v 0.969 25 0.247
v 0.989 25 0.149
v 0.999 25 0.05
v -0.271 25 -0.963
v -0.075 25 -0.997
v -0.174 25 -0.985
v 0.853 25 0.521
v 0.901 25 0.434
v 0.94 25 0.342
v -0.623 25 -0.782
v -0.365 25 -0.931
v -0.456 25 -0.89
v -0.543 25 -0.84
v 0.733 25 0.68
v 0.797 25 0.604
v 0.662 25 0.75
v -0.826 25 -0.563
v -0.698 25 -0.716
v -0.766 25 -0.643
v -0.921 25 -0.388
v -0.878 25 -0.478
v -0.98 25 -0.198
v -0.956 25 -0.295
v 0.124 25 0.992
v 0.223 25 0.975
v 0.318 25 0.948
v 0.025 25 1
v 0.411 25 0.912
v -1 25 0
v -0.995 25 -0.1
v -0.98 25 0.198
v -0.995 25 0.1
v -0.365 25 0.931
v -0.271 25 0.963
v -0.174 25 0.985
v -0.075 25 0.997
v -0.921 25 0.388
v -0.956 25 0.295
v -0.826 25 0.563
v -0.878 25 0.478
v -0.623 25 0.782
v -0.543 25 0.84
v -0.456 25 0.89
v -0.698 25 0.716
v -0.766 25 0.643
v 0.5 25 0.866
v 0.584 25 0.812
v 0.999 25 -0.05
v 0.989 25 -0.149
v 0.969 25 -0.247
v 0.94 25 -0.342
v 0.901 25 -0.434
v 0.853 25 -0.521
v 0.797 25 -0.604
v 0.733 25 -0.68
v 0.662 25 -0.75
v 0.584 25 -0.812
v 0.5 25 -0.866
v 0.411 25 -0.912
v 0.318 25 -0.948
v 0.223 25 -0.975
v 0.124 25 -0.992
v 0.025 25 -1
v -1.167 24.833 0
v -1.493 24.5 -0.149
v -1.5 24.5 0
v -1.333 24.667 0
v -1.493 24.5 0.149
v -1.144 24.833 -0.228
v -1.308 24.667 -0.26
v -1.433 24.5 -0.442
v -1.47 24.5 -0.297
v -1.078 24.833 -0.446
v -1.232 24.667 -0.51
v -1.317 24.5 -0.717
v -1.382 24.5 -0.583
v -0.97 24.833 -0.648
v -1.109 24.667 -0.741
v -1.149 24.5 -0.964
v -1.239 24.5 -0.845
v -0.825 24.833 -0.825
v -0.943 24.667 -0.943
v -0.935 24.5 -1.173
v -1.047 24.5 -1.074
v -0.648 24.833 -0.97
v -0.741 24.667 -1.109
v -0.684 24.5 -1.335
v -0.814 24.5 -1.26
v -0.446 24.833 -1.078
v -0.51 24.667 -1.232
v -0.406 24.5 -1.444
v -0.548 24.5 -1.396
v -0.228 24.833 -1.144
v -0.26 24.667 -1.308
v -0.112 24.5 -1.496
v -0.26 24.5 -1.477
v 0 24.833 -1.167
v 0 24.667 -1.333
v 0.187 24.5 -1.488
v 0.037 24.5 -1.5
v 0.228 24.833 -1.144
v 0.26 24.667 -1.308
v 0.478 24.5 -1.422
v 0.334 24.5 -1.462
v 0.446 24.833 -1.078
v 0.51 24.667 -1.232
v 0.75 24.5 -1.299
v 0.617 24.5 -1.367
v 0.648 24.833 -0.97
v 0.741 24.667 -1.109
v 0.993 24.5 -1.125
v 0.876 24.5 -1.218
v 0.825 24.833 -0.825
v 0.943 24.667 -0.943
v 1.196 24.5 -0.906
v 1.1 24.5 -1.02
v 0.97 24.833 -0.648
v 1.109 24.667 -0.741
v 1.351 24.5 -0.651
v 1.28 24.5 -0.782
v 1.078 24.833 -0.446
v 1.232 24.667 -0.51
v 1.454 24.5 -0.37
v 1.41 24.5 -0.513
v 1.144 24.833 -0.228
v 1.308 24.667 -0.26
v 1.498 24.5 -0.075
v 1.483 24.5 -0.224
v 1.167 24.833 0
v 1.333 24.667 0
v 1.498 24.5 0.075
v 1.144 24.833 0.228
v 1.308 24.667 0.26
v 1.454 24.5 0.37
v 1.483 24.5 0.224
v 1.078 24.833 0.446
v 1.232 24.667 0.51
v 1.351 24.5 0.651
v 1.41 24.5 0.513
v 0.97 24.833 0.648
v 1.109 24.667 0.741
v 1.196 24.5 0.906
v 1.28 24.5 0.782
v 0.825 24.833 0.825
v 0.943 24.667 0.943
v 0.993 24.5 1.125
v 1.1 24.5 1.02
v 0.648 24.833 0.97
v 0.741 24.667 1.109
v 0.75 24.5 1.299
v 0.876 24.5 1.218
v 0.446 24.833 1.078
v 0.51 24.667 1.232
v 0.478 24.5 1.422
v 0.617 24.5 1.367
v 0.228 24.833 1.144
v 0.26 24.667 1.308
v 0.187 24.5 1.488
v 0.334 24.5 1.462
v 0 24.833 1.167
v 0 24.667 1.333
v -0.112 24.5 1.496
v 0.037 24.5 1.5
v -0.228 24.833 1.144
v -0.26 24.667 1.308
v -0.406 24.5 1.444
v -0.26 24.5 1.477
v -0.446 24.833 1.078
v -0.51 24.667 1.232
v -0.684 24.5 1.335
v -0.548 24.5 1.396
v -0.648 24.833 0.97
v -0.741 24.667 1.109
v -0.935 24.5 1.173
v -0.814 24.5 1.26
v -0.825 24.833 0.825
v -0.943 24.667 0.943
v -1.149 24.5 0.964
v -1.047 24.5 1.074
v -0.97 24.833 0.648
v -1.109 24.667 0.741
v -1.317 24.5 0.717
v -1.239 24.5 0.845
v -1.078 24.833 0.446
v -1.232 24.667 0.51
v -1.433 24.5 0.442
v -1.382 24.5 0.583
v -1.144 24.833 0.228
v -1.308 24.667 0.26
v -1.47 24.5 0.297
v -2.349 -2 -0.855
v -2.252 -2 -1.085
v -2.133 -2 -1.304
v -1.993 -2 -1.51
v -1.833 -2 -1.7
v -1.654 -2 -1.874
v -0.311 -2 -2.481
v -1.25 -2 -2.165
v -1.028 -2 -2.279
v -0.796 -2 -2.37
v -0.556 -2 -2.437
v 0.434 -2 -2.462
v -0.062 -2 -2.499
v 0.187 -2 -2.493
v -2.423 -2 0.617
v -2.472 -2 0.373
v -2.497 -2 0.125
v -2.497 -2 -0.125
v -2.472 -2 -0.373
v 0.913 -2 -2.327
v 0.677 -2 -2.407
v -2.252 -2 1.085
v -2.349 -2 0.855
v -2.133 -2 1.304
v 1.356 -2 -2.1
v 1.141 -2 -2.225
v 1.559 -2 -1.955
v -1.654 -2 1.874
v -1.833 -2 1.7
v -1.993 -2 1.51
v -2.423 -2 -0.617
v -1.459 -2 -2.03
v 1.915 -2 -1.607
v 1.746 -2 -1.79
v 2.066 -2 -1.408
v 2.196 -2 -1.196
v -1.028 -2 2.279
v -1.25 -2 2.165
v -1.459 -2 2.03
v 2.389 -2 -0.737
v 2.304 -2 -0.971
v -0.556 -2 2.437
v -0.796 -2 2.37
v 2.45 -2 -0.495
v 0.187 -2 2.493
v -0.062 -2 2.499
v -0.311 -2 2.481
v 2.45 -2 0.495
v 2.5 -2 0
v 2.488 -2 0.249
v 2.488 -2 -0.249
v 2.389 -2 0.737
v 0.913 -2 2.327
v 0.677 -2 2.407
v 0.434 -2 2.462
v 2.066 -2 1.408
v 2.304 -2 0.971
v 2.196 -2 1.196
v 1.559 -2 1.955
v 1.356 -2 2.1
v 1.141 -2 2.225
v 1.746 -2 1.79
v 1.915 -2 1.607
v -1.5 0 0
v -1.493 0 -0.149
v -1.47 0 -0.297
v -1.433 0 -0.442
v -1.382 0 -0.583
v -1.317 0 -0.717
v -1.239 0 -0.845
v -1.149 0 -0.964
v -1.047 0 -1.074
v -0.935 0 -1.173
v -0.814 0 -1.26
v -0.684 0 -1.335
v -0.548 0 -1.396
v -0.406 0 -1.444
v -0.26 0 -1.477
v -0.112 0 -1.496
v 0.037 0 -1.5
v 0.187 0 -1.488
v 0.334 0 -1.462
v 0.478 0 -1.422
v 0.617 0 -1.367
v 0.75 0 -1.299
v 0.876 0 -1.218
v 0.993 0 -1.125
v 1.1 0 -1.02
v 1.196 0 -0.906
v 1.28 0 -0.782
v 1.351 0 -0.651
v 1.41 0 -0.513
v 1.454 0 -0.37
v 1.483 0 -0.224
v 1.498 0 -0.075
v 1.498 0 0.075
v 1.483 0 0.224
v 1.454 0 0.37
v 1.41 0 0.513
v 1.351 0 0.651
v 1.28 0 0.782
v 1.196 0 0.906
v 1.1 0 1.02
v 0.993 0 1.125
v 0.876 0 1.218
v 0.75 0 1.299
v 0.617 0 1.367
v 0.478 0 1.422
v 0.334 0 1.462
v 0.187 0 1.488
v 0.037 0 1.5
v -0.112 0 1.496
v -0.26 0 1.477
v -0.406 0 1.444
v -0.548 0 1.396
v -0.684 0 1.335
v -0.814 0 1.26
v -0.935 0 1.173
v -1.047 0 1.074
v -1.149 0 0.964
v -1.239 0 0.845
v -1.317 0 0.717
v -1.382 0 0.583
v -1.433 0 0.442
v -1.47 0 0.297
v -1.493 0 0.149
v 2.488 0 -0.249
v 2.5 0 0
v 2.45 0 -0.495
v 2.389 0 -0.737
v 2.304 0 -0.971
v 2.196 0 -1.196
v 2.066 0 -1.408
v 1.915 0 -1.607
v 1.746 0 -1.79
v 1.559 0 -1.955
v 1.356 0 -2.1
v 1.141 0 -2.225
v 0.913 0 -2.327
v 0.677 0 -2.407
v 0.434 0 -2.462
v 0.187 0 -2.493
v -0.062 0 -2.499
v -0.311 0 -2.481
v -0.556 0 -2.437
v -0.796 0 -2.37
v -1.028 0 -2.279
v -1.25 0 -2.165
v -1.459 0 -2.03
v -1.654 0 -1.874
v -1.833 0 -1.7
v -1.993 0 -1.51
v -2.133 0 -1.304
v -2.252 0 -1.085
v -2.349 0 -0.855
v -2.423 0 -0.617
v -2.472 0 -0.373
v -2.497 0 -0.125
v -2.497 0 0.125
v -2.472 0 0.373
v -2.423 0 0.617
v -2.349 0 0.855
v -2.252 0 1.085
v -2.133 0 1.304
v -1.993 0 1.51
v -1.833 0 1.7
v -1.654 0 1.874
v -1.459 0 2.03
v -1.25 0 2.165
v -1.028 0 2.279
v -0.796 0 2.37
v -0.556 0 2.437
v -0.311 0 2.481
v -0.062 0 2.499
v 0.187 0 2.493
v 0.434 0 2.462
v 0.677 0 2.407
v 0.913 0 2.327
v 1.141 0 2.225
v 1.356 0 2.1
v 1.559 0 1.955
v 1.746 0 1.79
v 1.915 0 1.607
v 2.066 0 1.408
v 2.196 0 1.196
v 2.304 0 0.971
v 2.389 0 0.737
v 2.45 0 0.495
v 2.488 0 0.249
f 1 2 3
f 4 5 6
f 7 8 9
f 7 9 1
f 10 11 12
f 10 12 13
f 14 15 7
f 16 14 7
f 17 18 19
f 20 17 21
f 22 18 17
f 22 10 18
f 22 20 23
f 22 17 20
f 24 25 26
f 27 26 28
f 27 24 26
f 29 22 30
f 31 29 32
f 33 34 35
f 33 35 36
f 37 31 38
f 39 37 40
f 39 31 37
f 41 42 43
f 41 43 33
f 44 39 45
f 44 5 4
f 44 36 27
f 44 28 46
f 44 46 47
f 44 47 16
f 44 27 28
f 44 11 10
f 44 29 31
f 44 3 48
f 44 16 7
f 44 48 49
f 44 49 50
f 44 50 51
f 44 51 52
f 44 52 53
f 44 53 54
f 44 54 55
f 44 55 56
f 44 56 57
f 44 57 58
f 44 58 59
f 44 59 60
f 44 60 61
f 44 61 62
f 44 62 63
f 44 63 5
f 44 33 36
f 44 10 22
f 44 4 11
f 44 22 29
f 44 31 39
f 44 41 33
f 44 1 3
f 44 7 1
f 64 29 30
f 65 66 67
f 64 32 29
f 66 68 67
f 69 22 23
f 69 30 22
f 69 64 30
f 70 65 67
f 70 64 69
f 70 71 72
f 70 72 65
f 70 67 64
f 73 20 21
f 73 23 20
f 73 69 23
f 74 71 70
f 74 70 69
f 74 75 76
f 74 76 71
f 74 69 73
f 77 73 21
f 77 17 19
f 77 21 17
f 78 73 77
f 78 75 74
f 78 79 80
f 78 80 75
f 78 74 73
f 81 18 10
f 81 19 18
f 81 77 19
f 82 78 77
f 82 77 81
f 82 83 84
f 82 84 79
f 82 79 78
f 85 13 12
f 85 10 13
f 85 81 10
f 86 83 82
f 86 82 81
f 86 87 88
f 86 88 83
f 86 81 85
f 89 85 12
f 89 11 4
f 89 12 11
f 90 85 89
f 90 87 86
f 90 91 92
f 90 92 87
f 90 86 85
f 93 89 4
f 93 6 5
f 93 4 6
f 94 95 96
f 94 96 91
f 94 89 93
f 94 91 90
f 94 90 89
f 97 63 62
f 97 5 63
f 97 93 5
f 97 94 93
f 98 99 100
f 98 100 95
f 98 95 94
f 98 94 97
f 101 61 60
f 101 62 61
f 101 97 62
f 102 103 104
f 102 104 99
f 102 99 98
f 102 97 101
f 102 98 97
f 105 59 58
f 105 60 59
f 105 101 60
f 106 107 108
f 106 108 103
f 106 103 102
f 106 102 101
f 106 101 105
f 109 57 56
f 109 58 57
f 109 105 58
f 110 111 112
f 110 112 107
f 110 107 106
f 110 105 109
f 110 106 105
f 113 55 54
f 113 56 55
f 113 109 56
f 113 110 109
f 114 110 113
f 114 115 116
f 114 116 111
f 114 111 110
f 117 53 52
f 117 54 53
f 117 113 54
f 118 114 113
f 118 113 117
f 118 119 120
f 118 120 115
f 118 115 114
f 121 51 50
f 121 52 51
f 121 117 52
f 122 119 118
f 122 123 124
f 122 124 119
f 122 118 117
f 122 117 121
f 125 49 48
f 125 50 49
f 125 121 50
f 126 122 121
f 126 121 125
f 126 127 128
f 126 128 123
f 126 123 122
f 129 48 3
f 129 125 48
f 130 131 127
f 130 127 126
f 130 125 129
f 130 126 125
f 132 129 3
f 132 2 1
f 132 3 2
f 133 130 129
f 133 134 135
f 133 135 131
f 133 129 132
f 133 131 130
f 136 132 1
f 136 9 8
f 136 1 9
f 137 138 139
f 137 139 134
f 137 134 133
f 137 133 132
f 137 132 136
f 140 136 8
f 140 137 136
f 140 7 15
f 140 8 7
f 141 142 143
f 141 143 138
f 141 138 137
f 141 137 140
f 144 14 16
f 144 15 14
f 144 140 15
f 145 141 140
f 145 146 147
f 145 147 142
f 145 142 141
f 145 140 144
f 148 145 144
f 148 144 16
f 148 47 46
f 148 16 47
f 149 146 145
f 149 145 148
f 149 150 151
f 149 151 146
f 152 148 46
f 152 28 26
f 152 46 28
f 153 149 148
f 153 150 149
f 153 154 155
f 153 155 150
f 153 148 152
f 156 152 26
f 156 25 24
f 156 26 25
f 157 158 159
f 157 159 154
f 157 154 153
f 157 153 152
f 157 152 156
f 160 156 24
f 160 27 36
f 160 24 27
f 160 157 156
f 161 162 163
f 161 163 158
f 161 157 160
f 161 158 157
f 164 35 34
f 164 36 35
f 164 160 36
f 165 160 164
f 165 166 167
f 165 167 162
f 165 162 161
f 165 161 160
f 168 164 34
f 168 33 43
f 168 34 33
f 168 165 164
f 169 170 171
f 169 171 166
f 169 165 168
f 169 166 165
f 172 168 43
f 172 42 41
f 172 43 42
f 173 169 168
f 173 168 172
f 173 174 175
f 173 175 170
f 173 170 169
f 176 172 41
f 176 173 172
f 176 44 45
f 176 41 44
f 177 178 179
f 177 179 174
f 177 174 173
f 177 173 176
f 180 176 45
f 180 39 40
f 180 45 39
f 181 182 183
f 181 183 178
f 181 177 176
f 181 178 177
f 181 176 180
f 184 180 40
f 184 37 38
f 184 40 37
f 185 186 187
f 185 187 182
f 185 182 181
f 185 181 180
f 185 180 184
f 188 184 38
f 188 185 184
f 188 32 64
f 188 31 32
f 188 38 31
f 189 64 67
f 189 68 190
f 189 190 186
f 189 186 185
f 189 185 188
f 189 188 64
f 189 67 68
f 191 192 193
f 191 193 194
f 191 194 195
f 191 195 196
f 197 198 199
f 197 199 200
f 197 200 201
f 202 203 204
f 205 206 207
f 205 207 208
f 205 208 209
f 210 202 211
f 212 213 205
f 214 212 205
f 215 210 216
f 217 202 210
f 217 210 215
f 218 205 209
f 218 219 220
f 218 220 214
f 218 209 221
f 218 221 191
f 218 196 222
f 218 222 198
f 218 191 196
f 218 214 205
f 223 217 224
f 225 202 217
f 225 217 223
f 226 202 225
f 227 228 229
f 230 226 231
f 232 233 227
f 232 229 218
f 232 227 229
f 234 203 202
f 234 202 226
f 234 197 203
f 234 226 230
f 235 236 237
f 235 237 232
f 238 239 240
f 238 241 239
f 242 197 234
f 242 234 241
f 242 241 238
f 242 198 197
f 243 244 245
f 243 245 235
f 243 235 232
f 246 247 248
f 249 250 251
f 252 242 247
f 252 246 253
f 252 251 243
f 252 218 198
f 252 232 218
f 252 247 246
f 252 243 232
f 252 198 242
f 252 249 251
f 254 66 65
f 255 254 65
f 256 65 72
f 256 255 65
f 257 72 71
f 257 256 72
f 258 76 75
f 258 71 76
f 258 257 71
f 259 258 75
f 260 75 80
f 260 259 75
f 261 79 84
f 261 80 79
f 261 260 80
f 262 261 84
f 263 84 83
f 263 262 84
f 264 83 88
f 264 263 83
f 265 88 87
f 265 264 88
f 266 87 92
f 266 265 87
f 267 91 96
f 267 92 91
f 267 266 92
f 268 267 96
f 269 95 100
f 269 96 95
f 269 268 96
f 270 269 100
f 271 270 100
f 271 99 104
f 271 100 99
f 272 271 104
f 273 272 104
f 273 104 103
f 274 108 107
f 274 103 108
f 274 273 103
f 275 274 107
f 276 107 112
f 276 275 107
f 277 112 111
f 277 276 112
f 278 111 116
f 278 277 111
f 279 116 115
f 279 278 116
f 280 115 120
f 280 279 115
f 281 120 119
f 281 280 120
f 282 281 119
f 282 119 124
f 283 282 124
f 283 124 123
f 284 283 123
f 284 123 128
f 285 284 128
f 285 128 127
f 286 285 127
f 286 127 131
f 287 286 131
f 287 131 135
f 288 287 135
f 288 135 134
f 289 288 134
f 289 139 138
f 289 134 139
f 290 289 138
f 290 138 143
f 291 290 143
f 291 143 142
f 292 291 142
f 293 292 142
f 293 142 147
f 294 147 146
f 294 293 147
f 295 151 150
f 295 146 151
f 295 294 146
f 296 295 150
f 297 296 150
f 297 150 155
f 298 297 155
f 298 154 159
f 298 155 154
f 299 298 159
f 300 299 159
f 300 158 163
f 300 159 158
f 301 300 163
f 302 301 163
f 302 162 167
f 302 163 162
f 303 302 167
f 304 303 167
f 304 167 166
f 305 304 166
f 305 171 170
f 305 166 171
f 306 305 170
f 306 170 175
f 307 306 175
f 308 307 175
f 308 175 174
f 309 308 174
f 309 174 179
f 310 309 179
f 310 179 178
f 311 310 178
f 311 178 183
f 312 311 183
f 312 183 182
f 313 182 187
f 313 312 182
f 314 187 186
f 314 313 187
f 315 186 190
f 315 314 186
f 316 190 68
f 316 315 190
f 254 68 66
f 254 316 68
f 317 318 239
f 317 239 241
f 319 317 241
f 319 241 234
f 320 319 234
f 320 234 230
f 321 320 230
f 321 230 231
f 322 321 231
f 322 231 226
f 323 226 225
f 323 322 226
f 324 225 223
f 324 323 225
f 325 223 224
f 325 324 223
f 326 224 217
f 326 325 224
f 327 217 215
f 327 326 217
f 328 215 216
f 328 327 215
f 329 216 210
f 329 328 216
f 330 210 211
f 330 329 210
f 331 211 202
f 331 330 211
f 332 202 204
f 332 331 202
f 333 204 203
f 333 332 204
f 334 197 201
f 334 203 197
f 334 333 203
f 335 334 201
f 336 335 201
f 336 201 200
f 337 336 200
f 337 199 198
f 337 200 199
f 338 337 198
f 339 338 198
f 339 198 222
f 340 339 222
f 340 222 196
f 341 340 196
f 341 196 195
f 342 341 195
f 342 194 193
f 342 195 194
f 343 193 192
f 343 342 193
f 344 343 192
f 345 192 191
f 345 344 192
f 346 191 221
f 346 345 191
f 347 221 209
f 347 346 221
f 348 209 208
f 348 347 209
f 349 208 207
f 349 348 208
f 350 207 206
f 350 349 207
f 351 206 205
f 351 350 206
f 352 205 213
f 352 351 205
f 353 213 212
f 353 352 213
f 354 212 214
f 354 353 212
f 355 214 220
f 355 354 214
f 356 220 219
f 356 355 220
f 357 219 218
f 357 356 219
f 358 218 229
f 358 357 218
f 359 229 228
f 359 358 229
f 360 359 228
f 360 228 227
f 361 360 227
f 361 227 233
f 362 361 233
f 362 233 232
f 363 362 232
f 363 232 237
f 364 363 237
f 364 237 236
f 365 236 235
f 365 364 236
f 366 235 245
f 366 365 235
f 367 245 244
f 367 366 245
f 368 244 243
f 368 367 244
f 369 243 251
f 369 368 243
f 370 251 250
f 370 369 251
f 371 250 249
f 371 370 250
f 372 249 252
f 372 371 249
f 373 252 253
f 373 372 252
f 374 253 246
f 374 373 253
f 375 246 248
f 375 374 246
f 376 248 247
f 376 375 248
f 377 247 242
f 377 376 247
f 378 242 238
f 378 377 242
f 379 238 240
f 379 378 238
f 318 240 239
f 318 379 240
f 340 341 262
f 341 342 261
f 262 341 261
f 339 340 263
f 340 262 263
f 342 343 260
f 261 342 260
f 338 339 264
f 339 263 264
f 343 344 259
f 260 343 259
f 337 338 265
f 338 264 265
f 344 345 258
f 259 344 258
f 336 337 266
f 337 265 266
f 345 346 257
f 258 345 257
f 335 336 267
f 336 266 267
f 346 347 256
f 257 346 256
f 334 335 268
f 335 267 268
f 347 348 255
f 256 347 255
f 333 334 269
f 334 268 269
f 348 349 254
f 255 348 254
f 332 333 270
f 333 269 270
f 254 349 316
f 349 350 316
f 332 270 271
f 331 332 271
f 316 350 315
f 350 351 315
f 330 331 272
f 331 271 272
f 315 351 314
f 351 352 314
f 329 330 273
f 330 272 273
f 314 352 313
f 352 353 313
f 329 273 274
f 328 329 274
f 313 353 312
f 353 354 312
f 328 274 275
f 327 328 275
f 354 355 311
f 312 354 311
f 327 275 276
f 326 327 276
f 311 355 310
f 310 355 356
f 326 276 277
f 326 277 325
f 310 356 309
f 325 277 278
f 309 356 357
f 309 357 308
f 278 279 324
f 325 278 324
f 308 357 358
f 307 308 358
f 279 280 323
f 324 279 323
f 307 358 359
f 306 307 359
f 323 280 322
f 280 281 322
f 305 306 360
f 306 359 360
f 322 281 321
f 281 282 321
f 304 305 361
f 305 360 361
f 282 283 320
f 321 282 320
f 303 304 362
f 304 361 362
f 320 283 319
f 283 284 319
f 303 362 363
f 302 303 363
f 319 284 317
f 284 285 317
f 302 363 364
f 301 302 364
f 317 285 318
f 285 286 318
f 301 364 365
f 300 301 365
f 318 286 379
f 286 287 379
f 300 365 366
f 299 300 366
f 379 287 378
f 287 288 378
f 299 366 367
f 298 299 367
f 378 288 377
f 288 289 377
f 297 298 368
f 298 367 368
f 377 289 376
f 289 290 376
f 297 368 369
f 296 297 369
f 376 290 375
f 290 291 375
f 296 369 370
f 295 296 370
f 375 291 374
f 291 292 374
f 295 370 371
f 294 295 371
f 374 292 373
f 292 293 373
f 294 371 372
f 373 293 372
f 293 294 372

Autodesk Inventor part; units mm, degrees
ref_plane "YZ Plane" through (0, 0, 0) normal (1, 0, 0) x (0, 1, 0)
ref_plane "XZ Plane" through (0, 0, 0) normal (0, 1, 0) x (-1, 0, 0)
ref_plane "XY Plane" through (0, 0, 0) normal (0, 0, 1) x (1, 0, 0)
sketch "Sketch1" plane through (0, 0, 0) normal (0, 1, 0) x (-1, 0, 0)
  circle A0 centre (0, 0) radius 1.5
  dimension "d0" = 3
extrude "Extrusion1" add sketch "Sketch1" along normal blind 25
sketch "Sketch2" plane through (0, 0, 0) normal (0, -1, 0) x (1, 0, 0)
  circle A0 centre (0, 0) radius 2.5
  dimension "d3" = 5
extrude "Extrusion2" add sketch "Sketch2" along normal blind 2
chamfer "Chamfer1" distance 0.5 angle 45 1 edges at (1.5, 25, 0)
properties part number "M3x25Bolt"
